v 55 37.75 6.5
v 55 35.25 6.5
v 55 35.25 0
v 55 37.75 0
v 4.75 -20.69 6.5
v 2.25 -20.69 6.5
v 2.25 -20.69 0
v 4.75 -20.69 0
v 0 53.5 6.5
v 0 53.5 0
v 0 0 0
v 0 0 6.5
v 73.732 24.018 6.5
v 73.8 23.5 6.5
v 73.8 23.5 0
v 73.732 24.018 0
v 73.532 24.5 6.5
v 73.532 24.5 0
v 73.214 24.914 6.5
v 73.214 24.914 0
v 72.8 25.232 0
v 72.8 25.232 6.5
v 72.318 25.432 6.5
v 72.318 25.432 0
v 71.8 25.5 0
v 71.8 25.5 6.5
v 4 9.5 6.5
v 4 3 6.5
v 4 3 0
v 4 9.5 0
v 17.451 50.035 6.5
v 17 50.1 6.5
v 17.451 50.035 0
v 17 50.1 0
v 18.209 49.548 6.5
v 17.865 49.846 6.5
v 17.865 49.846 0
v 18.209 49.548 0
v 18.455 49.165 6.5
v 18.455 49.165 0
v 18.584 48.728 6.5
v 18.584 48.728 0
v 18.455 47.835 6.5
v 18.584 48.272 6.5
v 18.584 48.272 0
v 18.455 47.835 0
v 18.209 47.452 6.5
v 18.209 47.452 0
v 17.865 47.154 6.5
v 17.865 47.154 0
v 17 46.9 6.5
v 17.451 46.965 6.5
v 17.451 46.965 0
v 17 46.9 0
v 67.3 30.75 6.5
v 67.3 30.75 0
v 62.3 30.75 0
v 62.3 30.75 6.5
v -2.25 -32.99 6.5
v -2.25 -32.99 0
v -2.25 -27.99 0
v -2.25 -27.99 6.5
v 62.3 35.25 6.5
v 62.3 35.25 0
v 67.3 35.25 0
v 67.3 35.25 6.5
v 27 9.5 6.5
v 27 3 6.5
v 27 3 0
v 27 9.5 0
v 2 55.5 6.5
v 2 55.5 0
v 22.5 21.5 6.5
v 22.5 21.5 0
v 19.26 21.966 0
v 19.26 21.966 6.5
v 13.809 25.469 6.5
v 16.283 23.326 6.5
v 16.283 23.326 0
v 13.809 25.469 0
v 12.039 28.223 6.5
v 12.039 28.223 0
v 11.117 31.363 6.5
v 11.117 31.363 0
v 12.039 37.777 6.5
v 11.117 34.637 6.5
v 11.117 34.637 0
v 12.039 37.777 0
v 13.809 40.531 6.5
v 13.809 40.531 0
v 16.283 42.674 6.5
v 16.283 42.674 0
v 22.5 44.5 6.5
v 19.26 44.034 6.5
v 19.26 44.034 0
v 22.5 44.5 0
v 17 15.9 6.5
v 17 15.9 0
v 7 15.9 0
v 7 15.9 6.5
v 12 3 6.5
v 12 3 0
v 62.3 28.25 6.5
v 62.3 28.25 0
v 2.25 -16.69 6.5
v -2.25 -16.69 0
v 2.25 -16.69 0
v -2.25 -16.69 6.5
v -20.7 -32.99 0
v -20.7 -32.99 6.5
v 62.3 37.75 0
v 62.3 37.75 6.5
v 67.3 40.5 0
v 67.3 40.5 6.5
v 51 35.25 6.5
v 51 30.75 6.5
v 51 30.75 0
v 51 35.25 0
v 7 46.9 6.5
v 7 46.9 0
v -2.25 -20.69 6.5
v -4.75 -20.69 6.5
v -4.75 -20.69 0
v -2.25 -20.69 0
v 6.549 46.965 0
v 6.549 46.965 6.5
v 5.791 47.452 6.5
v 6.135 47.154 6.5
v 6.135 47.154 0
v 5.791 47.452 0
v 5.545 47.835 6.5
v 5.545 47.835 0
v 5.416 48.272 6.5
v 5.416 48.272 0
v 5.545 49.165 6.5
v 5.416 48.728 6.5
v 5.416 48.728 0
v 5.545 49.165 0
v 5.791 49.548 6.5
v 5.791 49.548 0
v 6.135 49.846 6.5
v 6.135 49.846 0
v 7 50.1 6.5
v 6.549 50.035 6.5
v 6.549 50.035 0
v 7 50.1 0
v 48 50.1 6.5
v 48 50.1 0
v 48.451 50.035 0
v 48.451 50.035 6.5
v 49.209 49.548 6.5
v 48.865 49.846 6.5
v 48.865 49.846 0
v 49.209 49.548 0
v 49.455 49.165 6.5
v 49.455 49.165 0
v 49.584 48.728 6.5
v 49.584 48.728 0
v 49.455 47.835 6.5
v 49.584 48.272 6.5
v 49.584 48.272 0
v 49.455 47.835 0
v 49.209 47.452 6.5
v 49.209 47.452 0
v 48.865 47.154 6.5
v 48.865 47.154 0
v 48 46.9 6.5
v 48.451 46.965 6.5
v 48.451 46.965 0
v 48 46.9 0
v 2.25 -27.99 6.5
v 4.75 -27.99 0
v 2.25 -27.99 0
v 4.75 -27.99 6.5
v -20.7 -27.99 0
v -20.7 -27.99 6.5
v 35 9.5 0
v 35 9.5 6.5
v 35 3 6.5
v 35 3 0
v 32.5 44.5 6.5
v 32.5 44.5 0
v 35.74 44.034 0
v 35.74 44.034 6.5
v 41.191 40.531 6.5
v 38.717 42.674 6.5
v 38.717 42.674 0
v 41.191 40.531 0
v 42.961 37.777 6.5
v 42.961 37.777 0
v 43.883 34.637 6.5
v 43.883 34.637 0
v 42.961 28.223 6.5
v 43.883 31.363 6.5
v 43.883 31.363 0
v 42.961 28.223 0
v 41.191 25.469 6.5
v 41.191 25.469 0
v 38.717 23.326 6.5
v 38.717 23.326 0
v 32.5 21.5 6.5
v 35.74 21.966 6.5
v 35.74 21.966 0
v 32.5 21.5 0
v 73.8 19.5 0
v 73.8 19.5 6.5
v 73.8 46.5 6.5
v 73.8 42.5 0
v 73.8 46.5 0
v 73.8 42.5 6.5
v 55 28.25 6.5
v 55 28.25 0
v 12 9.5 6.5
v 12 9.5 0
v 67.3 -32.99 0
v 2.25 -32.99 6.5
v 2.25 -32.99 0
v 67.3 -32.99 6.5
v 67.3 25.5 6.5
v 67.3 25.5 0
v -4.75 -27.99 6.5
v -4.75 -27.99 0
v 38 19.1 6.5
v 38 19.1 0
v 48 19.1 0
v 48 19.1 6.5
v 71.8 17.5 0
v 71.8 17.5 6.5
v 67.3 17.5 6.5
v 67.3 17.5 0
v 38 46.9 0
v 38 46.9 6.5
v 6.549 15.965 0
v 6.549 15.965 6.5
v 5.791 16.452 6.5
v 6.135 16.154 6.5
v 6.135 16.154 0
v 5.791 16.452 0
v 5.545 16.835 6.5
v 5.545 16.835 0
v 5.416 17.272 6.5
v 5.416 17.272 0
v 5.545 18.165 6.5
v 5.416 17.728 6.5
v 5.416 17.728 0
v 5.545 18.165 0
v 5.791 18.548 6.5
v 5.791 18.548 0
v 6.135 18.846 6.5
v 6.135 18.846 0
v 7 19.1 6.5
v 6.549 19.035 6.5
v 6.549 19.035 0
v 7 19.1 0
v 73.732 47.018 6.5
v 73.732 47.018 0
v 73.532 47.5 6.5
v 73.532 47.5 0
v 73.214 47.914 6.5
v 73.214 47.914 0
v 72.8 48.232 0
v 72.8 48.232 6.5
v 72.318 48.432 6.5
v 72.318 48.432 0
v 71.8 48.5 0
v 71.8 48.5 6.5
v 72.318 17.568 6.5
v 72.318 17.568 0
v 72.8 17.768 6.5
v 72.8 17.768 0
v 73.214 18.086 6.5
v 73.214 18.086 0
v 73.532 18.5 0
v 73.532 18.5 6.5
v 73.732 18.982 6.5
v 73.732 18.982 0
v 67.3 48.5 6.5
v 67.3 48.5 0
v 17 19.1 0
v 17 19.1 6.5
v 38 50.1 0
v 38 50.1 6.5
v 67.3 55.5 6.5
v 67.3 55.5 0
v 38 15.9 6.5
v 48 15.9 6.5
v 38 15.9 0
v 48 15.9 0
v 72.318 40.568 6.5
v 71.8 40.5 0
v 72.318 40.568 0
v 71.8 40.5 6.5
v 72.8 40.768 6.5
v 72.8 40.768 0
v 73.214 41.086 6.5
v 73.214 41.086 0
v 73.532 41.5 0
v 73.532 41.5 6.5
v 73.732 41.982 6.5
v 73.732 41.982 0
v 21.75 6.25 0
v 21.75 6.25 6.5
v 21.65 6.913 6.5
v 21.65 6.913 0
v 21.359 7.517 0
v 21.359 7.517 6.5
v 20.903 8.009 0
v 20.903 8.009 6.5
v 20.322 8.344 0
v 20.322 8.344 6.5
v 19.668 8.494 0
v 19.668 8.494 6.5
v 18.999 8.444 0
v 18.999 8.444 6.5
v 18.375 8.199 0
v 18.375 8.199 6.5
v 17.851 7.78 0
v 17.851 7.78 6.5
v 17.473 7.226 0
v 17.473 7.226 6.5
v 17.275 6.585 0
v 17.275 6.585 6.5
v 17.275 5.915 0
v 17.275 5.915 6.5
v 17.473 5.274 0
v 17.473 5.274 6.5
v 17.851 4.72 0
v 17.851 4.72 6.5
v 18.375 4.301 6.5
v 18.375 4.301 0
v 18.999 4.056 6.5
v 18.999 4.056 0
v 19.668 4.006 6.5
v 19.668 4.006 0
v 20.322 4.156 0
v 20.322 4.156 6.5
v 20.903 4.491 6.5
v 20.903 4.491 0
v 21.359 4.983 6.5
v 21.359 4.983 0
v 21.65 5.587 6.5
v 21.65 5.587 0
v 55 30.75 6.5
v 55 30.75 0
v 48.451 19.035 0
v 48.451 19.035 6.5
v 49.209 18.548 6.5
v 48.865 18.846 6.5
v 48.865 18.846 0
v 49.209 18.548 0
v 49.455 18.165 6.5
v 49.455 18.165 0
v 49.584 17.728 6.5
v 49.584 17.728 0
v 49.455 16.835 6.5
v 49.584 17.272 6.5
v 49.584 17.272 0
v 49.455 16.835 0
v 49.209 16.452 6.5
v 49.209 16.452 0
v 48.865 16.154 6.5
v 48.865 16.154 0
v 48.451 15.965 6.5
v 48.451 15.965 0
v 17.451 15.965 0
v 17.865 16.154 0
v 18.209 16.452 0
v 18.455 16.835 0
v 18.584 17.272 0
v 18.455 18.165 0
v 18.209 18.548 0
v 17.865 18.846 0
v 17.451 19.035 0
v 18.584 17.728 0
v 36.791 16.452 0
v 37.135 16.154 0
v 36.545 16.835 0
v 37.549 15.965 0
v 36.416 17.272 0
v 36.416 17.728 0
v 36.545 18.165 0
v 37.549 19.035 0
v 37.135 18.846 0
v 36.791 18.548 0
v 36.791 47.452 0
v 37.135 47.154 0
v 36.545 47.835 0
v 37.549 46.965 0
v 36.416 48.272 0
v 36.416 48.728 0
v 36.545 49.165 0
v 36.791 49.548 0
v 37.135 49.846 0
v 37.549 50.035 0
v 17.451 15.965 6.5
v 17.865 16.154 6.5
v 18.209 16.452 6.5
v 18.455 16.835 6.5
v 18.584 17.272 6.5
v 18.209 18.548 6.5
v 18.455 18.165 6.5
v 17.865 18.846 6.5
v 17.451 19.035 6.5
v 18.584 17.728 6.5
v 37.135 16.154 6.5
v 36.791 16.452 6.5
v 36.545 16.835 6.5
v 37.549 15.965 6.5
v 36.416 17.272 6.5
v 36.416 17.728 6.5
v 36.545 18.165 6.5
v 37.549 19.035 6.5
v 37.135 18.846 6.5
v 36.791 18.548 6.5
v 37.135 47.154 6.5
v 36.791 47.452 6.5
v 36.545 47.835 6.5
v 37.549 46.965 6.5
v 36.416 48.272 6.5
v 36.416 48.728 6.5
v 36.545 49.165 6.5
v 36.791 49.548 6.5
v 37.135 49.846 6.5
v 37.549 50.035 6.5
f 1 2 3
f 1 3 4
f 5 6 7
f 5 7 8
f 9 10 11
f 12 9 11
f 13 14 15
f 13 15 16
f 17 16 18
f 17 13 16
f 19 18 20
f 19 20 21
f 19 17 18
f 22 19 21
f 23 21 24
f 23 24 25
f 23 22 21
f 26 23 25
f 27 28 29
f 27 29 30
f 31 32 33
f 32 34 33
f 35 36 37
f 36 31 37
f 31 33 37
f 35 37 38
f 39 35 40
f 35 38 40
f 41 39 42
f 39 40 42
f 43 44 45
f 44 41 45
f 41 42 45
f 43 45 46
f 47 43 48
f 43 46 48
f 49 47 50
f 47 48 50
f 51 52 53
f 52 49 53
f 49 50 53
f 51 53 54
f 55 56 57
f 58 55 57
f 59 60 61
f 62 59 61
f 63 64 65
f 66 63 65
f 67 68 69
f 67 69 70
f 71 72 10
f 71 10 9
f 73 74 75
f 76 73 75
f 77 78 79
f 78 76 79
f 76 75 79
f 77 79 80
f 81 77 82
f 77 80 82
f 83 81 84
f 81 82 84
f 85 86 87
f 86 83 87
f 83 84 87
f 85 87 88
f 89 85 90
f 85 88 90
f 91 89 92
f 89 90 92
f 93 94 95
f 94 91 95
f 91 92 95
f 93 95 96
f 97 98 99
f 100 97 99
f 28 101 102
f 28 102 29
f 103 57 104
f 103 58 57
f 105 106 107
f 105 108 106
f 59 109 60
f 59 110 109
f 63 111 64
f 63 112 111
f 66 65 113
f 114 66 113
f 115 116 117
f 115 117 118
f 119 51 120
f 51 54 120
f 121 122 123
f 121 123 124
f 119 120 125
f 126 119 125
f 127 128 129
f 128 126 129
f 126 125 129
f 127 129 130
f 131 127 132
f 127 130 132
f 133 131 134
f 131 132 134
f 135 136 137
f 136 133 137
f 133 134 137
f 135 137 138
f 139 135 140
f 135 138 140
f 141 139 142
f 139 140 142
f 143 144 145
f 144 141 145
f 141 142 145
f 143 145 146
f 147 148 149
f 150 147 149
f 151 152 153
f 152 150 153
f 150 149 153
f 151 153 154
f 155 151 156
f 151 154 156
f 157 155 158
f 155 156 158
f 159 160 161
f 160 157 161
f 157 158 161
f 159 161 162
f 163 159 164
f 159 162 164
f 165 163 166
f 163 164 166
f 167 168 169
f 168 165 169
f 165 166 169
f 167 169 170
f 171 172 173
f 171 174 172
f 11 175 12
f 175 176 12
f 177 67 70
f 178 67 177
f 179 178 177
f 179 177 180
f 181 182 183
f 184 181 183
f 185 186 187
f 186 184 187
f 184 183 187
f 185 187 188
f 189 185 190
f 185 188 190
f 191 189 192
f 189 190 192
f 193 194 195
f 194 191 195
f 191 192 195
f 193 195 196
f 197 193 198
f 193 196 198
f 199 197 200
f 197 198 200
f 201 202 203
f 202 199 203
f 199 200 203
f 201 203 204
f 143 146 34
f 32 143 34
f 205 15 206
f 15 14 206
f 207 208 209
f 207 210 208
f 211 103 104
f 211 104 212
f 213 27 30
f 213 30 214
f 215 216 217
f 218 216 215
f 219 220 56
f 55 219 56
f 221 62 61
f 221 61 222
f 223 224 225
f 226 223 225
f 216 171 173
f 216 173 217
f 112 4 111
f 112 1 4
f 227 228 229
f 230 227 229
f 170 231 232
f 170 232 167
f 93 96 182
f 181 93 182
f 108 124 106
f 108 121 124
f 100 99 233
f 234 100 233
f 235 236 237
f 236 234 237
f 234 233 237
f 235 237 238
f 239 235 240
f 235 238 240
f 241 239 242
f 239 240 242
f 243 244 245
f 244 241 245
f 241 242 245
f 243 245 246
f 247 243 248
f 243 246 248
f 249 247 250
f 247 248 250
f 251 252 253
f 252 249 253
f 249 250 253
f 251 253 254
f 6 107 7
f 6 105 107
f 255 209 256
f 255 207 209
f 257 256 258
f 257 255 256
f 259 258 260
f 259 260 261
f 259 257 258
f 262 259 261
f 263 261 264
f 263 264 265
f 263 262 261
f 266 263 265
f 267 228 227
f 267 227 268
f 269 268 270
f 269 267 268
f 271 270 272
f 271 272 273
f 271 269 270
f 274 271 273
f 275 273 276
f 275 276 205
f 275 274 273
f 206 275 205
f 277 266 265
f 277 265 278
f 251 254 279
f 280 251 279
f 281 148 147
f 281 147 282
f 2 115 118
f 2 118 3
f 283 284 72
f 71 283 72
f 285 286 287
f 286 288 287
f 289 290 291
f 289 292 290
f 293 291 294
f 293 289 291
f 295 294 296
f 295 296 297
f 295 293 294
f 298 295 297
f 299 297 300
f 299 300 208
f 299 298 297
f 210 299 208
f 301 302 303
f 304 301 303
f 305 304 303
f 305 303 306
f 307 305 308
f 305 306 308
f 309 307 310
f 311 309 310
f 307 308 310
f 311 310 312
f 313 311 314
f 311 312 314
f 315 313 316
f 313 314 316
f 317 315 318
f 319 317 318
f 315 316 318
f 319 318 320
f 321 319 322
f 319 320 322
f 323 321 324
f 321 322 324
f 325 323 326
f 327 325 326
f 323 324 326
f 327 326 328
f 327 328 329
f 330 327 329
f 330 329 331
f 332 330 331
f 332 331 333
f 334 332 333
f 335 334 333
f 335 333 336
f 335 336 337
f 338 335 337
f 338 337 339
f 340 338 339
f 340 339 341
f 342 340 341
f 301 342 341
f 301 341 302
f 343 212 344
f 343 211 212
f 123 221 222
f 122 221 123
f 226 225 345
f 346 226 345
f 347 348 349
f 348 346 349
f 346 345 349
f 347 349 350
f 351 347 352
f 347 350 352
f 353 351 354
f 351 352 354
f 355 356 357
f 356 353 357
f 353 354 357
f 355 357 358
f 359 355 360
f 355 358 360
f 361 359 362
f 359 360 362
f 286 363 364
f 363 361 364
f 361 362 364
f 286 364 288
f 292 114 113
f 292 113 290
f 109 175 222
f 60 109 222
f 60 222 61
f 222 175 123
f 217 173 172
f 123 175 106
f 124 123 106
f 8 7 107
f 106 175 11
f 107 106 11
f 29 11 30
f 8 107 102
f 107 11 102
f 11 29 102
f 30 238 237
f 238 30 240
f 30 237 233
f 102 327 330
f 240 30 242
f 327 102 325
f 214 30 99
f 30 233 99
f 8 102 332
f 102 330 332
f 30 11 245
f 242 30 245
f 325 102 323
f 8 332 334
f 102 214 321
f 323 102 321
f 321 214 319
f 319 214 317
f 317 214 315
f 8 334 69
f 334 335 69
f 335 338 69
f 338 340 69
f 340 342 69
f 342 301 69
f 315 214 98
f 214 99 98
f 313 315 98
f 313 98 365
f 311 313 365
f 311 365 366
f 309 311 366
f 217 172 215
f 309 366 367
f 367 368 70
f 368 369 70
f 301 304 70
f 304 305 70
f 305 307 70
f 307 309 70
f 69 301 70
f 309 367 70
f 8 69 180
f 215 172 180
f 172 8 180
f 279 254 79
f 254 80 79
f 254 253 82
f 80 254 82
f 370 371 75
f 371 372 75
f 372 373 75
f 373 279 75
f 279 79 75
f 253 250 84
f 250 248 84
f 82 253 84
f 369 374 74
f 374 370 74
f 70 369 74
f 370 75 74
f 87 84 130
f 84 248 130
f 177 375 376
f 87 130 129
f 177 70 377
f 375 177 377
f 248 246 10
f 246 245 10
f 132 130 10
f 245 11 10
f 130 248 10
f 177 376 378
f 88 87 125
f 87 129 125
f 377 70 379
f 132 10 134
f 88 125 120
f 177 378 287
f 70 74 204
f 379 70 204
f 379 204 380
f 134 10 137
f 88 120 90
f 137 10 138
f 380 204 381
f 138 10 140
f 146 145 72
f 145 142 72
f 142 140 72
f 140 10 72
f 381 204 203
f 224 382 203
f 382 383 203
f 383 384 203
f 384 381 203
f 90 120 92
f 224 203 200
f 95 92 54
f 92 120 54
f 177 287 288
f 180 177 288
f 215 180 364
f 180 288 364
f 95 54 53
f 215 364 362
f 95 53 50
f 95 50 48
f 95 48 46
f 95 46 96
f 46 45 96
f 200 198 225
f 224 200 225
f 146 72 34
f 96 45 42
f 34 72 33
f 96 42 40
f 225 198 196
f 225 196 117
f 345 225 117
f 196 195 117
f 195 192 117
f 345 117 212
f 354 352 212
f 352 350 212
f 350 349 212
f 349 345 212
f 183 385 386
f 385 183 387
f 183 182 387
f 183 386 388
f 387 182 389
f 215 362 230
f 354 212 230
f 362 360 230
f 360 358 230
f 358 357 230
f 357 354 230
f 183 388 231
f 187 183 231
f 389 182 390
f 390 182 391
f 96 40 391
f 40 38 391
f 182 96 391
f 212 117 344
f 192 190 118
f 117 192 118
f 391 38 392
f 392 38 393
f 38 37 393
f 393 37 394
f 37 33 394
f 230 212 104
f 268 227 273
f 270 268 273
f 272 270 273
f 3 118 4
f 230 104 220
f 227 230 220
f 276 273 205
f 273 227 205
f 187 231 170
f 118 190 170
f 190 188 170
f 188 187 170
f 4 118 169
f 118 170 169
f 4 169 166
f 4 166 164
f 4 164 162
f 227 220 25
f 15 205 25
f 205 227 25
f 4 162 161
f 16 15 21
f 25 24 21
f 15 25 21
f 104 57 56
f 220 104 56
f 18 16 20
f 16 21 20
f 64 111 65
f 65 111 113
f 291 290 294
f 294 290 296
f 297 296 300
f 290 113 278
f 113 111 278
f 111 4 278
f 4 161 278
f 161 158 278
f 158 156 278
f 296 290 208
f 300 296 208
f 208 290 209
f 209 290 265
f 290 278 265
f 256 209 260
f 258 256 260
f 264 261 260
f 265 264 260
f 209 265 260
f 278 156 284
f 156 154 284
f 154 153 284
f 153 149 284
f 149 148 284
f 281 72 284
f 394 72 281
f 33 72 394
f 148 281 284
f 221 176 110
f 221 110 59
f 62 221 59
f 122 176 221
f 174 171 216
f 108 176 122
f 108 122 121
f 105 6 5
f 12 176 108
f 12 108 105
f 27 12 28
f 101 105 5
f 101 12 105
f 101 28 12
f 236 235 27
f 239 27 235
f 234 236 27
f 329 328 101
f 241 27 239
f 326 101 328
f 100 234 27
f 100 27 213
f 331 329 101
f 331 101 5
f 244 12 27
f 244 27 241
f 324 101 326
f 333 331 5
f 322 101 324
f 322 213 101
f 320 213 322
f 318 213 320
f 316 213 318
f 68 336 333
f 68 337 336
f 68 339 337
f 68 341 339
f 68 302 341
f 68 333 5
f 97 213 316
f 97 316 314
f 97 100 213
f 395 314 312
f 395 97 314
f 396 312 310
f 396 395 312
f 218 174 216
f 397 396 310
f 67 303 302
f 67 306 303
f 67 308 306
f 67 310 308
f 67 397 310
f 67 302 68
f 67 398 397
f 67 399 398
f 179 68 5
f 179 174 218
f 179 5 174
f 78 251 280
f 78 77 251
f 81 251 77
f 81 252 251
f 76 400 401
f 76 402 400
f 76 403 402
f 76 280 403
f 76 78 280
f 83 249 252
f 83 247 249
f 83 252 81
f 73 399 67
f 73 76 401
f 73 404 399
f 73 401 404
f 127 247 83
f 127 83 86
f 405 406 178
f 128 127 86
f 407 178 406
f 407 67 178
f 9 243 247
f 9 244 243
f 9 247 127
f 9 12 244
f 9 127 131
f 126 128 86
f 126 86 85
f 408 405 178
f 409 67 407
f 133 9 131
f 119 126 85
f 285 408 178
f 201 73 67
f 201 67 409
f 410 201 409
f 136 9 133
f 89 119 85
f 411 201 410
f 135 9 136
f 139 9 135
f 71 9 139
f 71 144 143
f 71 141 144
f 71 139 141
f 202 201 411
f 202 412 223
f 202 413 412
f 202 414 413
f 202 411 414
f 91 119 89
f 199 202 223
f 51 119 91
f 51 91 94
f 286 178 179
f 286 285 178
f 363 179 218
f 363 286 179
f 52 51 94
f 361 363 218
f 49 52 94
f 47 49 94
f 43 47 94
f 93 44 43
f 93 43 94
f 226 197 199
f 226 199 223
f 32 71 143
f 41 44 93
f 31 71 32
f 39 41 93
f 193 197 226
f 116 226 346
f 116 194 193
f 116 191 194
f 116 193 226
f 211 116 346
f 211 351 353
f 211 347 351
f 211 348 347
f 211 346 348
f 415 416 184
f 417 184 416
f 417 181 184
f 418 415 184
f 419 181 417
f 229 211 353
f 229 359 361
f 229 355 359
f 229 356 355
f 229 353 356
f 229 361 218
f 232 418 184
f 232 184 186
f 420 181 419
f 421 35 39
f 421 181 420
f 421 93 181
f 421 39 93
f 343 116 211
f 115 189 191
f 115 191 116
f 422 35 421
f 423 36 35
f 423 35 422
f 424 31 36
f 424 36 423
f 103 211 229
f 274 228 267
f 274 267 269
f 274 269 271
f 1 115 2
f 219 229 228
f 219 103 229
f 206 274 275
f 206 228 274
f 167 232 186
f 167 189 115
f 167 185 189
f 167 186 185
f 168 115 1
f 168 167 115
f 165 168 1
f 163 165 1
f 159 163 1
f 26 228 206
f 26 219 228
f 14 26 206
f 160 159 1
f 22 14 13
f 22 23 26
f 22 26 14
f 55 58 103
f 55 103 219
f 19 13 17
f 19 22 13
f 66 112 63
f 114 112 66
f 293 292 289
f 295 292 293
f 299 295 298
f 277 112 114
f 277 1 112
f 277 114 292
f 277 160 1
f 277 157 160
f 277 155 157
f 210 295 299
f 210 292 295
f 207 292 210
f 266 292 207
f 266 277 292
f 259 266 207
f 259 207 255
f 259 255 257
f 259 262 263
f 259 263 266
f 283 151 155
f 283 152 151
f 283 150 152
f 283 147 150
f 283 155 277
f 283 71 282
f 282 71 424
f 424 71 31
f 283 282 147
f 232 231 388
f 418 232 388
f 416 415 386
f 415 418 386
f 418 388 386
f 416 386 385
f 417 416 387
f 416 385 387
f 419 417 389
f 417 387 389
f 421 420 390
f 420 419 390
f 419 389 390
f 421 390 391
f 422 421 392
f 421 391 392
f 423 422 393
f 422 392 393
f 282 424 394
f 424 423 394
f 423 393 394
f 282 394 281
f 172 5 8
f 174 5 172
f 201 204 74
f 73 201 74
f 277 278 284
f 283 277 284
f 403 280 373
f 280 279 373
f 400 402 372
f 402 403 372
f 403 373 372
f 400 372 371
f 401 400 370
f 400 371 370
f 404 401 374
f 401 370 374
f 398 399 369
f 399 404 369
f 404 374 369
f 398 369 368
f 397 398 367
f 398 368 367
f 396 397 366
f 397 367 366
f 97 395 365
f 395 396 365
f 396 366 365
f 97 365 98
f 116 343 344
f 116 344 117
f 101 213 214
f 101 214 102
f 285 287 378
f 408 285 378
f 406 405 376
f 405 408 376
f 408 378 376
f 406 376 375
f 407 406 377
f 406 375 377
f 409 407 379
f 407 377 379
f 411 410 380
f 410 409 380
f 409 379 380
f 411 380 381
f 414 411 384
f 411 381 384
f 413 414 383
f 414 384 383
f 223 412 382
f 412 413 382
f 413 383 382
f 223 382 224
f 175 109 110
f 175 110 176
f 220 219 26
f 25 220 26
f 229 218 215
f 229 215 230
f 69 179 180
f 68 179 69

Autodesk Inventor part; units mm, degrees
ref_plane "YZ Plane" through (0, 0, 0) normal (1, 0, 0) x (0, 1, 0)
ref_plane "XZ Plane" through (0, 0, 0) normal (0, 1, 0) x (-1, 0, 0)
ref_plane "XY Plane" through (0, 0, 0) normal (0, 0, 1) x (1, 0, 0)
sketch "Sketch1" plane through (0, 0, 0) normal (0, 0, 1) x (1, 0, 0)
  line L0 (0, 0) -> (67.3, 0)
  line L1 (67.3, 0) -> (67.3, 55.5)
  line L2 (67.3, 55.5) -> (0, 55.5)
  line L3 (0, 55.5) -> (0, 0)
  line L4 (7, 48.5) -> (38, 48.5) construction
  line L5 (38, 48.5) -> (38, 17.5) construction
  line L6 (38, 17.5) -> (7, 17.5) construction
  line L7 (7, 17.5) -> (7, 48.5) construction
  line L8 (7, 48.5) -> (17, 48.5) construction
  line L9 (7, 50.1) -> (17, 50.1)
  line L10 (17, 46.9) -> (7, 46.9)
  arc A0 (7, 50.1) -> (7, 46.9) centre (7, 48.5) ccw
  arc A1 (17, 46.9) -> (17, 50.1) centre (17, 48.5) ccw
  line L11 (7, 17.5) -> (17, 17.5) construction
  line L12 (7, 19.1) -> (17, 19.1)
  line L13 (17, 15.9) -> (7, 15.9)
  arc A2 (7, 19.1) -> (7, 15.9) centre (7, 17.5) ccw
  arc A3 (17, 15.9) -> (17, 19.1) centre (17, 17.5) ccw
  line L14 (38, 48.5) -> (48, 48.5) construction
  line L15 (38, 46.9) -> (48, 46.9)
  line L16 (48, 50.1) -> (38, 50.1)
  arc A4 (38, 50.1) -> (38, 46.9) centre (38, 48.5) ccw
  arc A5 (48, 46.9) -> (48, 50.1) centre (48, 48.5) ccw
  line L17 (38, 17.5) -> (48, 17.5) construction
  line L18 (38, 19.1) -> (48, 19.1)
  line L19 (48, 15.9) -> (38, 15.9)
  arc A6 (38, 19.1) -> (38, 15.9) centre (38, 17.5) ccw
  arc A7 (48, 15.9) -> (48, 19.1) centre (48, 17.5) ccw
  line L20 (22.5, 33) -> (32.5, 33) construction
  line L21 (22.5, 44.5) -> (32.5, 44.5)
  line L22 (32.5, 21.5) -> (22.5, 21.5)
  arc A8 (22.5, 44.5) -> (22.5, 21.5) centre (22.5, 33) ccw
  arc A9 (32.5, 21.5) -> (32.5, 44.5) centre (32.5, 33) ccw
  point P0 (12, 48.5)
  point P1 (12, 17.5)
  point P2 (43, 48.5)
  point P3 (43, 17.5)
  point P4 (27.5, 33)
  point P5 (22.5, 48.5)
  point P6 (7, 33)
  dimension "d0" = 31
  dimension "d2" = 10
  dimension "d3" = 3.2
  dimension "d4" = 10
  dimension "d5" = 23
  dimension "d6" = 7
  dimension "d7" = 7
  dimension "d8" = 17.5
  dimension "d9" = 34.8
extrude "Extrusion1" add sketch "Sketch1" along normal blind 6.5
sketch "Sketch2" plane through (0, 0, 6.5) normal (0, 0, 1) x (1, 0, 0)
  line L0 (0, 0) -> (67.3, 0) projected
  line L1 (0, 55.5) -> (0, 0) projected
  line L2 (4, 9.5) -> (12, 9.5)
  line L3 (12, 9.5) -> (12, 3)
  line L4 (12, 3) -> (4, 3)
  line L5 (4, 3) -> (4, 9.5)
  line L6 (27, 9.5) -> (35, 9.5)
  line L7 (35, 9.5) -> (35, 3)
  line L8 (35, 3) -> (27, 3)
  line L9 (27, 3) -> (27, 9.5)
  line L10 (12, 3) -> (27, 9.5) construction
  line L11 (27, 3) -> (12, 9.5) construction
  circle A0 centre (19.5, 6.25) radius 2.25
  dimension "d12" = 8
  dimension "d13" = 6.5
  dimension "d14" = 15
  dimension "d15" = 4.5
  dimension "d16" = 3
  dimension "d17" = 4
  dimension "d18" = 8
extrude "Extrusion2" cut sketch "Sketch2" against normal through all
sketch "Sketch3" plane through (0, 0, 6.5) normal (0, 0, 1) x (1, 0, 0)
  arc A0 (32.5, 21.5) -> (32.5, 44.5) centre (32.5, 33) ccw projected
  line L0 (67.3, 0) -> (67.3, 55.5) projected
  line L1 (67.3, 35.25) -> (67.3, 30.75)
  line L2 (51, 30.75) -> (51, 35.25)
  line L3 (55, 37.75) -> (62.3, 37.75)
  line L4 (62.3, 28.25) -> (55, 28.25)
  line L5 (51, 35.25) -> (55, 35.25)
  line L6 (62.3, 35.25) -> (67.3, 35.25)
  line L7 (67.3, 30.75) -> (62.3, 30.75)
  line L8 (55, 30.75) -> (51, 30.75)
  line L9 (55, 28.25) -> (55, 30.75)
  line L10 (55, 35.25) -> (55, 37.75)
  line L11 (62.3, 37.75) -> (62.3, 35.25)
  line L12 (62.3, 30.75) -> (62.3, 28.25)
  point P0 (51, 33)
  dimension "d21" = 4.5
  dimension "d22" = 4
  dimension "d23" = 5
  dimension "d24" = 7.3
  dimension "d25" = 2.5
  dimension "d26" = 2.5
extrude "Extrusion3" cut sketch "Sketch3" against normal through all
sketch "Sketch4" plane through (0, 0, 6.5) normal (0, 0, 1) x (1, 0, 0)
  line L0 (67.3, 35.25) -> (67.3, 55.5) projected
  line L1 (67.3, 0) -> (67.3, 30.75) projected
  line L2 (51, 30.75) -> (51, 35.25) projected
  line L3 (67.3, 40.5) -> (71.8, 40.5)
  line L4 (73.8, 42.5) -> (73.8, 46.5)
  line L5 (71.8, 48.5) -> (67.3, 48.5)
  line L6 (67.3, 48.5) -> (67.3, 40.5)
  line L7 (67.3, 25.5) -> (71.8, 25.5)
  line L8 (73.8, 23.5) -> (73.8, 19.5)
  line L9 (71.8, 17.5) -> (67.3, 17.5)
  line L10 (67.3, 17.5) -> (67.3, 25.5)
  arc A0 (73.8, 46.5) -> (71.8, 48.5) centre (71.8, 46.5) ccw
  arc A1 (71.8, 40.5) -> (73.8, 42.5) centre (71.8, 42.5) ccw
  arc A2 (73.8, 23.5) -> (71.8, 25.5) centre (71.8, 23.5) ccw
  arc A3 (71.8, 17.5) -> (73.8, 19.5) centre (71.8, 19.5) ccw
  point P0 (51, 33)
  dimension "d29" = 2
  dimension "d30" = 8
  dimension "d31" = 8
  dimension "d32" = 6.5
  dimension "d33" = 15
  dimension "d34" = 7.5
extrude "Extrusion4" add sketch "Sketch4" against normal blind 6.5
chamfer "Chamfer1" distance 2 angle 45 1 edges at (0, 55.5, 3.25)
sketch "Sketch5" plane through (0, 0, 6.5) normal (0, 0, 1) x (1, 0, 0)
  line L0 (7, 50.1) -> (17, 50.1) projected
  line L1 (-20.7, -32.99) -> (67.3, -32.99)
  line L2 (67.3, -32.99) -> (67.3, 0)
  line L3 (0, 0) -> (67.3, 0)
  line L4 (-20.7, -32.99) -> (-20.7, -27.99)
  line L5 (-20.7, -27.99) -> (0, 0)
  point P0 (67.3, 55.5)
  dimension "d40" = 88.49
  dimension "d41" = 88
  dimension "d42" = 5
extrude "Extrusion5" add sketch "Sketch5" against normal blind 6.5
sketch "Sketch6" plane through (0, 0, 6.5) normal (0, 0, 1) x (1, 0, 0)
  line L0 (-20.7, -32.99) -> (67.3, -32.99) projected
  line L1 (-2.25, -16.69) -> (2.25, -16.69)
  line L2 (2.25, -32.99) -> (-2.25, -32.99)
  line L3 (4.75, -20.69) -> (4.75, -27.99)
  line L4 (-4.75, -27.99) -> (-4.75, -20.69)
  line L5 (-4.75, -20.69) -> (-2.25, -20.69)
  line L6 (2.25, -20.69) -> (4.75, -20.69)
  line L7 (4.75, -27.99) -> (2.25, -27.99)
  line L8 (-2.25, -27.99) -> (-4.75, -27.99)
  line L9 (-2.25, -32.99) -> (-2.25, -27.99)
  line L10 (-2.25, -20.69) -> (-2.25, -16.69)
  line L11 (2.25, -16.69) -> (2.25, -20.69)
  line L12 (2.25, -27.99) -> (2.25, -32.99)
  point P0 (0, 0)
  point P1 (0, -16.69)
  dimension "d45" = 4.5
  dimension "d46" = 2.5
  dimension "d47" = 2.5
  dimension "d48" = 5
  dimension "d49" = 4
  dimension "d50" = 7.3
extrude "Extrusion6" cut sketch "Sketch6" against normal through all
properties part number "y_motor_mount" material "Plywood, Finish"
